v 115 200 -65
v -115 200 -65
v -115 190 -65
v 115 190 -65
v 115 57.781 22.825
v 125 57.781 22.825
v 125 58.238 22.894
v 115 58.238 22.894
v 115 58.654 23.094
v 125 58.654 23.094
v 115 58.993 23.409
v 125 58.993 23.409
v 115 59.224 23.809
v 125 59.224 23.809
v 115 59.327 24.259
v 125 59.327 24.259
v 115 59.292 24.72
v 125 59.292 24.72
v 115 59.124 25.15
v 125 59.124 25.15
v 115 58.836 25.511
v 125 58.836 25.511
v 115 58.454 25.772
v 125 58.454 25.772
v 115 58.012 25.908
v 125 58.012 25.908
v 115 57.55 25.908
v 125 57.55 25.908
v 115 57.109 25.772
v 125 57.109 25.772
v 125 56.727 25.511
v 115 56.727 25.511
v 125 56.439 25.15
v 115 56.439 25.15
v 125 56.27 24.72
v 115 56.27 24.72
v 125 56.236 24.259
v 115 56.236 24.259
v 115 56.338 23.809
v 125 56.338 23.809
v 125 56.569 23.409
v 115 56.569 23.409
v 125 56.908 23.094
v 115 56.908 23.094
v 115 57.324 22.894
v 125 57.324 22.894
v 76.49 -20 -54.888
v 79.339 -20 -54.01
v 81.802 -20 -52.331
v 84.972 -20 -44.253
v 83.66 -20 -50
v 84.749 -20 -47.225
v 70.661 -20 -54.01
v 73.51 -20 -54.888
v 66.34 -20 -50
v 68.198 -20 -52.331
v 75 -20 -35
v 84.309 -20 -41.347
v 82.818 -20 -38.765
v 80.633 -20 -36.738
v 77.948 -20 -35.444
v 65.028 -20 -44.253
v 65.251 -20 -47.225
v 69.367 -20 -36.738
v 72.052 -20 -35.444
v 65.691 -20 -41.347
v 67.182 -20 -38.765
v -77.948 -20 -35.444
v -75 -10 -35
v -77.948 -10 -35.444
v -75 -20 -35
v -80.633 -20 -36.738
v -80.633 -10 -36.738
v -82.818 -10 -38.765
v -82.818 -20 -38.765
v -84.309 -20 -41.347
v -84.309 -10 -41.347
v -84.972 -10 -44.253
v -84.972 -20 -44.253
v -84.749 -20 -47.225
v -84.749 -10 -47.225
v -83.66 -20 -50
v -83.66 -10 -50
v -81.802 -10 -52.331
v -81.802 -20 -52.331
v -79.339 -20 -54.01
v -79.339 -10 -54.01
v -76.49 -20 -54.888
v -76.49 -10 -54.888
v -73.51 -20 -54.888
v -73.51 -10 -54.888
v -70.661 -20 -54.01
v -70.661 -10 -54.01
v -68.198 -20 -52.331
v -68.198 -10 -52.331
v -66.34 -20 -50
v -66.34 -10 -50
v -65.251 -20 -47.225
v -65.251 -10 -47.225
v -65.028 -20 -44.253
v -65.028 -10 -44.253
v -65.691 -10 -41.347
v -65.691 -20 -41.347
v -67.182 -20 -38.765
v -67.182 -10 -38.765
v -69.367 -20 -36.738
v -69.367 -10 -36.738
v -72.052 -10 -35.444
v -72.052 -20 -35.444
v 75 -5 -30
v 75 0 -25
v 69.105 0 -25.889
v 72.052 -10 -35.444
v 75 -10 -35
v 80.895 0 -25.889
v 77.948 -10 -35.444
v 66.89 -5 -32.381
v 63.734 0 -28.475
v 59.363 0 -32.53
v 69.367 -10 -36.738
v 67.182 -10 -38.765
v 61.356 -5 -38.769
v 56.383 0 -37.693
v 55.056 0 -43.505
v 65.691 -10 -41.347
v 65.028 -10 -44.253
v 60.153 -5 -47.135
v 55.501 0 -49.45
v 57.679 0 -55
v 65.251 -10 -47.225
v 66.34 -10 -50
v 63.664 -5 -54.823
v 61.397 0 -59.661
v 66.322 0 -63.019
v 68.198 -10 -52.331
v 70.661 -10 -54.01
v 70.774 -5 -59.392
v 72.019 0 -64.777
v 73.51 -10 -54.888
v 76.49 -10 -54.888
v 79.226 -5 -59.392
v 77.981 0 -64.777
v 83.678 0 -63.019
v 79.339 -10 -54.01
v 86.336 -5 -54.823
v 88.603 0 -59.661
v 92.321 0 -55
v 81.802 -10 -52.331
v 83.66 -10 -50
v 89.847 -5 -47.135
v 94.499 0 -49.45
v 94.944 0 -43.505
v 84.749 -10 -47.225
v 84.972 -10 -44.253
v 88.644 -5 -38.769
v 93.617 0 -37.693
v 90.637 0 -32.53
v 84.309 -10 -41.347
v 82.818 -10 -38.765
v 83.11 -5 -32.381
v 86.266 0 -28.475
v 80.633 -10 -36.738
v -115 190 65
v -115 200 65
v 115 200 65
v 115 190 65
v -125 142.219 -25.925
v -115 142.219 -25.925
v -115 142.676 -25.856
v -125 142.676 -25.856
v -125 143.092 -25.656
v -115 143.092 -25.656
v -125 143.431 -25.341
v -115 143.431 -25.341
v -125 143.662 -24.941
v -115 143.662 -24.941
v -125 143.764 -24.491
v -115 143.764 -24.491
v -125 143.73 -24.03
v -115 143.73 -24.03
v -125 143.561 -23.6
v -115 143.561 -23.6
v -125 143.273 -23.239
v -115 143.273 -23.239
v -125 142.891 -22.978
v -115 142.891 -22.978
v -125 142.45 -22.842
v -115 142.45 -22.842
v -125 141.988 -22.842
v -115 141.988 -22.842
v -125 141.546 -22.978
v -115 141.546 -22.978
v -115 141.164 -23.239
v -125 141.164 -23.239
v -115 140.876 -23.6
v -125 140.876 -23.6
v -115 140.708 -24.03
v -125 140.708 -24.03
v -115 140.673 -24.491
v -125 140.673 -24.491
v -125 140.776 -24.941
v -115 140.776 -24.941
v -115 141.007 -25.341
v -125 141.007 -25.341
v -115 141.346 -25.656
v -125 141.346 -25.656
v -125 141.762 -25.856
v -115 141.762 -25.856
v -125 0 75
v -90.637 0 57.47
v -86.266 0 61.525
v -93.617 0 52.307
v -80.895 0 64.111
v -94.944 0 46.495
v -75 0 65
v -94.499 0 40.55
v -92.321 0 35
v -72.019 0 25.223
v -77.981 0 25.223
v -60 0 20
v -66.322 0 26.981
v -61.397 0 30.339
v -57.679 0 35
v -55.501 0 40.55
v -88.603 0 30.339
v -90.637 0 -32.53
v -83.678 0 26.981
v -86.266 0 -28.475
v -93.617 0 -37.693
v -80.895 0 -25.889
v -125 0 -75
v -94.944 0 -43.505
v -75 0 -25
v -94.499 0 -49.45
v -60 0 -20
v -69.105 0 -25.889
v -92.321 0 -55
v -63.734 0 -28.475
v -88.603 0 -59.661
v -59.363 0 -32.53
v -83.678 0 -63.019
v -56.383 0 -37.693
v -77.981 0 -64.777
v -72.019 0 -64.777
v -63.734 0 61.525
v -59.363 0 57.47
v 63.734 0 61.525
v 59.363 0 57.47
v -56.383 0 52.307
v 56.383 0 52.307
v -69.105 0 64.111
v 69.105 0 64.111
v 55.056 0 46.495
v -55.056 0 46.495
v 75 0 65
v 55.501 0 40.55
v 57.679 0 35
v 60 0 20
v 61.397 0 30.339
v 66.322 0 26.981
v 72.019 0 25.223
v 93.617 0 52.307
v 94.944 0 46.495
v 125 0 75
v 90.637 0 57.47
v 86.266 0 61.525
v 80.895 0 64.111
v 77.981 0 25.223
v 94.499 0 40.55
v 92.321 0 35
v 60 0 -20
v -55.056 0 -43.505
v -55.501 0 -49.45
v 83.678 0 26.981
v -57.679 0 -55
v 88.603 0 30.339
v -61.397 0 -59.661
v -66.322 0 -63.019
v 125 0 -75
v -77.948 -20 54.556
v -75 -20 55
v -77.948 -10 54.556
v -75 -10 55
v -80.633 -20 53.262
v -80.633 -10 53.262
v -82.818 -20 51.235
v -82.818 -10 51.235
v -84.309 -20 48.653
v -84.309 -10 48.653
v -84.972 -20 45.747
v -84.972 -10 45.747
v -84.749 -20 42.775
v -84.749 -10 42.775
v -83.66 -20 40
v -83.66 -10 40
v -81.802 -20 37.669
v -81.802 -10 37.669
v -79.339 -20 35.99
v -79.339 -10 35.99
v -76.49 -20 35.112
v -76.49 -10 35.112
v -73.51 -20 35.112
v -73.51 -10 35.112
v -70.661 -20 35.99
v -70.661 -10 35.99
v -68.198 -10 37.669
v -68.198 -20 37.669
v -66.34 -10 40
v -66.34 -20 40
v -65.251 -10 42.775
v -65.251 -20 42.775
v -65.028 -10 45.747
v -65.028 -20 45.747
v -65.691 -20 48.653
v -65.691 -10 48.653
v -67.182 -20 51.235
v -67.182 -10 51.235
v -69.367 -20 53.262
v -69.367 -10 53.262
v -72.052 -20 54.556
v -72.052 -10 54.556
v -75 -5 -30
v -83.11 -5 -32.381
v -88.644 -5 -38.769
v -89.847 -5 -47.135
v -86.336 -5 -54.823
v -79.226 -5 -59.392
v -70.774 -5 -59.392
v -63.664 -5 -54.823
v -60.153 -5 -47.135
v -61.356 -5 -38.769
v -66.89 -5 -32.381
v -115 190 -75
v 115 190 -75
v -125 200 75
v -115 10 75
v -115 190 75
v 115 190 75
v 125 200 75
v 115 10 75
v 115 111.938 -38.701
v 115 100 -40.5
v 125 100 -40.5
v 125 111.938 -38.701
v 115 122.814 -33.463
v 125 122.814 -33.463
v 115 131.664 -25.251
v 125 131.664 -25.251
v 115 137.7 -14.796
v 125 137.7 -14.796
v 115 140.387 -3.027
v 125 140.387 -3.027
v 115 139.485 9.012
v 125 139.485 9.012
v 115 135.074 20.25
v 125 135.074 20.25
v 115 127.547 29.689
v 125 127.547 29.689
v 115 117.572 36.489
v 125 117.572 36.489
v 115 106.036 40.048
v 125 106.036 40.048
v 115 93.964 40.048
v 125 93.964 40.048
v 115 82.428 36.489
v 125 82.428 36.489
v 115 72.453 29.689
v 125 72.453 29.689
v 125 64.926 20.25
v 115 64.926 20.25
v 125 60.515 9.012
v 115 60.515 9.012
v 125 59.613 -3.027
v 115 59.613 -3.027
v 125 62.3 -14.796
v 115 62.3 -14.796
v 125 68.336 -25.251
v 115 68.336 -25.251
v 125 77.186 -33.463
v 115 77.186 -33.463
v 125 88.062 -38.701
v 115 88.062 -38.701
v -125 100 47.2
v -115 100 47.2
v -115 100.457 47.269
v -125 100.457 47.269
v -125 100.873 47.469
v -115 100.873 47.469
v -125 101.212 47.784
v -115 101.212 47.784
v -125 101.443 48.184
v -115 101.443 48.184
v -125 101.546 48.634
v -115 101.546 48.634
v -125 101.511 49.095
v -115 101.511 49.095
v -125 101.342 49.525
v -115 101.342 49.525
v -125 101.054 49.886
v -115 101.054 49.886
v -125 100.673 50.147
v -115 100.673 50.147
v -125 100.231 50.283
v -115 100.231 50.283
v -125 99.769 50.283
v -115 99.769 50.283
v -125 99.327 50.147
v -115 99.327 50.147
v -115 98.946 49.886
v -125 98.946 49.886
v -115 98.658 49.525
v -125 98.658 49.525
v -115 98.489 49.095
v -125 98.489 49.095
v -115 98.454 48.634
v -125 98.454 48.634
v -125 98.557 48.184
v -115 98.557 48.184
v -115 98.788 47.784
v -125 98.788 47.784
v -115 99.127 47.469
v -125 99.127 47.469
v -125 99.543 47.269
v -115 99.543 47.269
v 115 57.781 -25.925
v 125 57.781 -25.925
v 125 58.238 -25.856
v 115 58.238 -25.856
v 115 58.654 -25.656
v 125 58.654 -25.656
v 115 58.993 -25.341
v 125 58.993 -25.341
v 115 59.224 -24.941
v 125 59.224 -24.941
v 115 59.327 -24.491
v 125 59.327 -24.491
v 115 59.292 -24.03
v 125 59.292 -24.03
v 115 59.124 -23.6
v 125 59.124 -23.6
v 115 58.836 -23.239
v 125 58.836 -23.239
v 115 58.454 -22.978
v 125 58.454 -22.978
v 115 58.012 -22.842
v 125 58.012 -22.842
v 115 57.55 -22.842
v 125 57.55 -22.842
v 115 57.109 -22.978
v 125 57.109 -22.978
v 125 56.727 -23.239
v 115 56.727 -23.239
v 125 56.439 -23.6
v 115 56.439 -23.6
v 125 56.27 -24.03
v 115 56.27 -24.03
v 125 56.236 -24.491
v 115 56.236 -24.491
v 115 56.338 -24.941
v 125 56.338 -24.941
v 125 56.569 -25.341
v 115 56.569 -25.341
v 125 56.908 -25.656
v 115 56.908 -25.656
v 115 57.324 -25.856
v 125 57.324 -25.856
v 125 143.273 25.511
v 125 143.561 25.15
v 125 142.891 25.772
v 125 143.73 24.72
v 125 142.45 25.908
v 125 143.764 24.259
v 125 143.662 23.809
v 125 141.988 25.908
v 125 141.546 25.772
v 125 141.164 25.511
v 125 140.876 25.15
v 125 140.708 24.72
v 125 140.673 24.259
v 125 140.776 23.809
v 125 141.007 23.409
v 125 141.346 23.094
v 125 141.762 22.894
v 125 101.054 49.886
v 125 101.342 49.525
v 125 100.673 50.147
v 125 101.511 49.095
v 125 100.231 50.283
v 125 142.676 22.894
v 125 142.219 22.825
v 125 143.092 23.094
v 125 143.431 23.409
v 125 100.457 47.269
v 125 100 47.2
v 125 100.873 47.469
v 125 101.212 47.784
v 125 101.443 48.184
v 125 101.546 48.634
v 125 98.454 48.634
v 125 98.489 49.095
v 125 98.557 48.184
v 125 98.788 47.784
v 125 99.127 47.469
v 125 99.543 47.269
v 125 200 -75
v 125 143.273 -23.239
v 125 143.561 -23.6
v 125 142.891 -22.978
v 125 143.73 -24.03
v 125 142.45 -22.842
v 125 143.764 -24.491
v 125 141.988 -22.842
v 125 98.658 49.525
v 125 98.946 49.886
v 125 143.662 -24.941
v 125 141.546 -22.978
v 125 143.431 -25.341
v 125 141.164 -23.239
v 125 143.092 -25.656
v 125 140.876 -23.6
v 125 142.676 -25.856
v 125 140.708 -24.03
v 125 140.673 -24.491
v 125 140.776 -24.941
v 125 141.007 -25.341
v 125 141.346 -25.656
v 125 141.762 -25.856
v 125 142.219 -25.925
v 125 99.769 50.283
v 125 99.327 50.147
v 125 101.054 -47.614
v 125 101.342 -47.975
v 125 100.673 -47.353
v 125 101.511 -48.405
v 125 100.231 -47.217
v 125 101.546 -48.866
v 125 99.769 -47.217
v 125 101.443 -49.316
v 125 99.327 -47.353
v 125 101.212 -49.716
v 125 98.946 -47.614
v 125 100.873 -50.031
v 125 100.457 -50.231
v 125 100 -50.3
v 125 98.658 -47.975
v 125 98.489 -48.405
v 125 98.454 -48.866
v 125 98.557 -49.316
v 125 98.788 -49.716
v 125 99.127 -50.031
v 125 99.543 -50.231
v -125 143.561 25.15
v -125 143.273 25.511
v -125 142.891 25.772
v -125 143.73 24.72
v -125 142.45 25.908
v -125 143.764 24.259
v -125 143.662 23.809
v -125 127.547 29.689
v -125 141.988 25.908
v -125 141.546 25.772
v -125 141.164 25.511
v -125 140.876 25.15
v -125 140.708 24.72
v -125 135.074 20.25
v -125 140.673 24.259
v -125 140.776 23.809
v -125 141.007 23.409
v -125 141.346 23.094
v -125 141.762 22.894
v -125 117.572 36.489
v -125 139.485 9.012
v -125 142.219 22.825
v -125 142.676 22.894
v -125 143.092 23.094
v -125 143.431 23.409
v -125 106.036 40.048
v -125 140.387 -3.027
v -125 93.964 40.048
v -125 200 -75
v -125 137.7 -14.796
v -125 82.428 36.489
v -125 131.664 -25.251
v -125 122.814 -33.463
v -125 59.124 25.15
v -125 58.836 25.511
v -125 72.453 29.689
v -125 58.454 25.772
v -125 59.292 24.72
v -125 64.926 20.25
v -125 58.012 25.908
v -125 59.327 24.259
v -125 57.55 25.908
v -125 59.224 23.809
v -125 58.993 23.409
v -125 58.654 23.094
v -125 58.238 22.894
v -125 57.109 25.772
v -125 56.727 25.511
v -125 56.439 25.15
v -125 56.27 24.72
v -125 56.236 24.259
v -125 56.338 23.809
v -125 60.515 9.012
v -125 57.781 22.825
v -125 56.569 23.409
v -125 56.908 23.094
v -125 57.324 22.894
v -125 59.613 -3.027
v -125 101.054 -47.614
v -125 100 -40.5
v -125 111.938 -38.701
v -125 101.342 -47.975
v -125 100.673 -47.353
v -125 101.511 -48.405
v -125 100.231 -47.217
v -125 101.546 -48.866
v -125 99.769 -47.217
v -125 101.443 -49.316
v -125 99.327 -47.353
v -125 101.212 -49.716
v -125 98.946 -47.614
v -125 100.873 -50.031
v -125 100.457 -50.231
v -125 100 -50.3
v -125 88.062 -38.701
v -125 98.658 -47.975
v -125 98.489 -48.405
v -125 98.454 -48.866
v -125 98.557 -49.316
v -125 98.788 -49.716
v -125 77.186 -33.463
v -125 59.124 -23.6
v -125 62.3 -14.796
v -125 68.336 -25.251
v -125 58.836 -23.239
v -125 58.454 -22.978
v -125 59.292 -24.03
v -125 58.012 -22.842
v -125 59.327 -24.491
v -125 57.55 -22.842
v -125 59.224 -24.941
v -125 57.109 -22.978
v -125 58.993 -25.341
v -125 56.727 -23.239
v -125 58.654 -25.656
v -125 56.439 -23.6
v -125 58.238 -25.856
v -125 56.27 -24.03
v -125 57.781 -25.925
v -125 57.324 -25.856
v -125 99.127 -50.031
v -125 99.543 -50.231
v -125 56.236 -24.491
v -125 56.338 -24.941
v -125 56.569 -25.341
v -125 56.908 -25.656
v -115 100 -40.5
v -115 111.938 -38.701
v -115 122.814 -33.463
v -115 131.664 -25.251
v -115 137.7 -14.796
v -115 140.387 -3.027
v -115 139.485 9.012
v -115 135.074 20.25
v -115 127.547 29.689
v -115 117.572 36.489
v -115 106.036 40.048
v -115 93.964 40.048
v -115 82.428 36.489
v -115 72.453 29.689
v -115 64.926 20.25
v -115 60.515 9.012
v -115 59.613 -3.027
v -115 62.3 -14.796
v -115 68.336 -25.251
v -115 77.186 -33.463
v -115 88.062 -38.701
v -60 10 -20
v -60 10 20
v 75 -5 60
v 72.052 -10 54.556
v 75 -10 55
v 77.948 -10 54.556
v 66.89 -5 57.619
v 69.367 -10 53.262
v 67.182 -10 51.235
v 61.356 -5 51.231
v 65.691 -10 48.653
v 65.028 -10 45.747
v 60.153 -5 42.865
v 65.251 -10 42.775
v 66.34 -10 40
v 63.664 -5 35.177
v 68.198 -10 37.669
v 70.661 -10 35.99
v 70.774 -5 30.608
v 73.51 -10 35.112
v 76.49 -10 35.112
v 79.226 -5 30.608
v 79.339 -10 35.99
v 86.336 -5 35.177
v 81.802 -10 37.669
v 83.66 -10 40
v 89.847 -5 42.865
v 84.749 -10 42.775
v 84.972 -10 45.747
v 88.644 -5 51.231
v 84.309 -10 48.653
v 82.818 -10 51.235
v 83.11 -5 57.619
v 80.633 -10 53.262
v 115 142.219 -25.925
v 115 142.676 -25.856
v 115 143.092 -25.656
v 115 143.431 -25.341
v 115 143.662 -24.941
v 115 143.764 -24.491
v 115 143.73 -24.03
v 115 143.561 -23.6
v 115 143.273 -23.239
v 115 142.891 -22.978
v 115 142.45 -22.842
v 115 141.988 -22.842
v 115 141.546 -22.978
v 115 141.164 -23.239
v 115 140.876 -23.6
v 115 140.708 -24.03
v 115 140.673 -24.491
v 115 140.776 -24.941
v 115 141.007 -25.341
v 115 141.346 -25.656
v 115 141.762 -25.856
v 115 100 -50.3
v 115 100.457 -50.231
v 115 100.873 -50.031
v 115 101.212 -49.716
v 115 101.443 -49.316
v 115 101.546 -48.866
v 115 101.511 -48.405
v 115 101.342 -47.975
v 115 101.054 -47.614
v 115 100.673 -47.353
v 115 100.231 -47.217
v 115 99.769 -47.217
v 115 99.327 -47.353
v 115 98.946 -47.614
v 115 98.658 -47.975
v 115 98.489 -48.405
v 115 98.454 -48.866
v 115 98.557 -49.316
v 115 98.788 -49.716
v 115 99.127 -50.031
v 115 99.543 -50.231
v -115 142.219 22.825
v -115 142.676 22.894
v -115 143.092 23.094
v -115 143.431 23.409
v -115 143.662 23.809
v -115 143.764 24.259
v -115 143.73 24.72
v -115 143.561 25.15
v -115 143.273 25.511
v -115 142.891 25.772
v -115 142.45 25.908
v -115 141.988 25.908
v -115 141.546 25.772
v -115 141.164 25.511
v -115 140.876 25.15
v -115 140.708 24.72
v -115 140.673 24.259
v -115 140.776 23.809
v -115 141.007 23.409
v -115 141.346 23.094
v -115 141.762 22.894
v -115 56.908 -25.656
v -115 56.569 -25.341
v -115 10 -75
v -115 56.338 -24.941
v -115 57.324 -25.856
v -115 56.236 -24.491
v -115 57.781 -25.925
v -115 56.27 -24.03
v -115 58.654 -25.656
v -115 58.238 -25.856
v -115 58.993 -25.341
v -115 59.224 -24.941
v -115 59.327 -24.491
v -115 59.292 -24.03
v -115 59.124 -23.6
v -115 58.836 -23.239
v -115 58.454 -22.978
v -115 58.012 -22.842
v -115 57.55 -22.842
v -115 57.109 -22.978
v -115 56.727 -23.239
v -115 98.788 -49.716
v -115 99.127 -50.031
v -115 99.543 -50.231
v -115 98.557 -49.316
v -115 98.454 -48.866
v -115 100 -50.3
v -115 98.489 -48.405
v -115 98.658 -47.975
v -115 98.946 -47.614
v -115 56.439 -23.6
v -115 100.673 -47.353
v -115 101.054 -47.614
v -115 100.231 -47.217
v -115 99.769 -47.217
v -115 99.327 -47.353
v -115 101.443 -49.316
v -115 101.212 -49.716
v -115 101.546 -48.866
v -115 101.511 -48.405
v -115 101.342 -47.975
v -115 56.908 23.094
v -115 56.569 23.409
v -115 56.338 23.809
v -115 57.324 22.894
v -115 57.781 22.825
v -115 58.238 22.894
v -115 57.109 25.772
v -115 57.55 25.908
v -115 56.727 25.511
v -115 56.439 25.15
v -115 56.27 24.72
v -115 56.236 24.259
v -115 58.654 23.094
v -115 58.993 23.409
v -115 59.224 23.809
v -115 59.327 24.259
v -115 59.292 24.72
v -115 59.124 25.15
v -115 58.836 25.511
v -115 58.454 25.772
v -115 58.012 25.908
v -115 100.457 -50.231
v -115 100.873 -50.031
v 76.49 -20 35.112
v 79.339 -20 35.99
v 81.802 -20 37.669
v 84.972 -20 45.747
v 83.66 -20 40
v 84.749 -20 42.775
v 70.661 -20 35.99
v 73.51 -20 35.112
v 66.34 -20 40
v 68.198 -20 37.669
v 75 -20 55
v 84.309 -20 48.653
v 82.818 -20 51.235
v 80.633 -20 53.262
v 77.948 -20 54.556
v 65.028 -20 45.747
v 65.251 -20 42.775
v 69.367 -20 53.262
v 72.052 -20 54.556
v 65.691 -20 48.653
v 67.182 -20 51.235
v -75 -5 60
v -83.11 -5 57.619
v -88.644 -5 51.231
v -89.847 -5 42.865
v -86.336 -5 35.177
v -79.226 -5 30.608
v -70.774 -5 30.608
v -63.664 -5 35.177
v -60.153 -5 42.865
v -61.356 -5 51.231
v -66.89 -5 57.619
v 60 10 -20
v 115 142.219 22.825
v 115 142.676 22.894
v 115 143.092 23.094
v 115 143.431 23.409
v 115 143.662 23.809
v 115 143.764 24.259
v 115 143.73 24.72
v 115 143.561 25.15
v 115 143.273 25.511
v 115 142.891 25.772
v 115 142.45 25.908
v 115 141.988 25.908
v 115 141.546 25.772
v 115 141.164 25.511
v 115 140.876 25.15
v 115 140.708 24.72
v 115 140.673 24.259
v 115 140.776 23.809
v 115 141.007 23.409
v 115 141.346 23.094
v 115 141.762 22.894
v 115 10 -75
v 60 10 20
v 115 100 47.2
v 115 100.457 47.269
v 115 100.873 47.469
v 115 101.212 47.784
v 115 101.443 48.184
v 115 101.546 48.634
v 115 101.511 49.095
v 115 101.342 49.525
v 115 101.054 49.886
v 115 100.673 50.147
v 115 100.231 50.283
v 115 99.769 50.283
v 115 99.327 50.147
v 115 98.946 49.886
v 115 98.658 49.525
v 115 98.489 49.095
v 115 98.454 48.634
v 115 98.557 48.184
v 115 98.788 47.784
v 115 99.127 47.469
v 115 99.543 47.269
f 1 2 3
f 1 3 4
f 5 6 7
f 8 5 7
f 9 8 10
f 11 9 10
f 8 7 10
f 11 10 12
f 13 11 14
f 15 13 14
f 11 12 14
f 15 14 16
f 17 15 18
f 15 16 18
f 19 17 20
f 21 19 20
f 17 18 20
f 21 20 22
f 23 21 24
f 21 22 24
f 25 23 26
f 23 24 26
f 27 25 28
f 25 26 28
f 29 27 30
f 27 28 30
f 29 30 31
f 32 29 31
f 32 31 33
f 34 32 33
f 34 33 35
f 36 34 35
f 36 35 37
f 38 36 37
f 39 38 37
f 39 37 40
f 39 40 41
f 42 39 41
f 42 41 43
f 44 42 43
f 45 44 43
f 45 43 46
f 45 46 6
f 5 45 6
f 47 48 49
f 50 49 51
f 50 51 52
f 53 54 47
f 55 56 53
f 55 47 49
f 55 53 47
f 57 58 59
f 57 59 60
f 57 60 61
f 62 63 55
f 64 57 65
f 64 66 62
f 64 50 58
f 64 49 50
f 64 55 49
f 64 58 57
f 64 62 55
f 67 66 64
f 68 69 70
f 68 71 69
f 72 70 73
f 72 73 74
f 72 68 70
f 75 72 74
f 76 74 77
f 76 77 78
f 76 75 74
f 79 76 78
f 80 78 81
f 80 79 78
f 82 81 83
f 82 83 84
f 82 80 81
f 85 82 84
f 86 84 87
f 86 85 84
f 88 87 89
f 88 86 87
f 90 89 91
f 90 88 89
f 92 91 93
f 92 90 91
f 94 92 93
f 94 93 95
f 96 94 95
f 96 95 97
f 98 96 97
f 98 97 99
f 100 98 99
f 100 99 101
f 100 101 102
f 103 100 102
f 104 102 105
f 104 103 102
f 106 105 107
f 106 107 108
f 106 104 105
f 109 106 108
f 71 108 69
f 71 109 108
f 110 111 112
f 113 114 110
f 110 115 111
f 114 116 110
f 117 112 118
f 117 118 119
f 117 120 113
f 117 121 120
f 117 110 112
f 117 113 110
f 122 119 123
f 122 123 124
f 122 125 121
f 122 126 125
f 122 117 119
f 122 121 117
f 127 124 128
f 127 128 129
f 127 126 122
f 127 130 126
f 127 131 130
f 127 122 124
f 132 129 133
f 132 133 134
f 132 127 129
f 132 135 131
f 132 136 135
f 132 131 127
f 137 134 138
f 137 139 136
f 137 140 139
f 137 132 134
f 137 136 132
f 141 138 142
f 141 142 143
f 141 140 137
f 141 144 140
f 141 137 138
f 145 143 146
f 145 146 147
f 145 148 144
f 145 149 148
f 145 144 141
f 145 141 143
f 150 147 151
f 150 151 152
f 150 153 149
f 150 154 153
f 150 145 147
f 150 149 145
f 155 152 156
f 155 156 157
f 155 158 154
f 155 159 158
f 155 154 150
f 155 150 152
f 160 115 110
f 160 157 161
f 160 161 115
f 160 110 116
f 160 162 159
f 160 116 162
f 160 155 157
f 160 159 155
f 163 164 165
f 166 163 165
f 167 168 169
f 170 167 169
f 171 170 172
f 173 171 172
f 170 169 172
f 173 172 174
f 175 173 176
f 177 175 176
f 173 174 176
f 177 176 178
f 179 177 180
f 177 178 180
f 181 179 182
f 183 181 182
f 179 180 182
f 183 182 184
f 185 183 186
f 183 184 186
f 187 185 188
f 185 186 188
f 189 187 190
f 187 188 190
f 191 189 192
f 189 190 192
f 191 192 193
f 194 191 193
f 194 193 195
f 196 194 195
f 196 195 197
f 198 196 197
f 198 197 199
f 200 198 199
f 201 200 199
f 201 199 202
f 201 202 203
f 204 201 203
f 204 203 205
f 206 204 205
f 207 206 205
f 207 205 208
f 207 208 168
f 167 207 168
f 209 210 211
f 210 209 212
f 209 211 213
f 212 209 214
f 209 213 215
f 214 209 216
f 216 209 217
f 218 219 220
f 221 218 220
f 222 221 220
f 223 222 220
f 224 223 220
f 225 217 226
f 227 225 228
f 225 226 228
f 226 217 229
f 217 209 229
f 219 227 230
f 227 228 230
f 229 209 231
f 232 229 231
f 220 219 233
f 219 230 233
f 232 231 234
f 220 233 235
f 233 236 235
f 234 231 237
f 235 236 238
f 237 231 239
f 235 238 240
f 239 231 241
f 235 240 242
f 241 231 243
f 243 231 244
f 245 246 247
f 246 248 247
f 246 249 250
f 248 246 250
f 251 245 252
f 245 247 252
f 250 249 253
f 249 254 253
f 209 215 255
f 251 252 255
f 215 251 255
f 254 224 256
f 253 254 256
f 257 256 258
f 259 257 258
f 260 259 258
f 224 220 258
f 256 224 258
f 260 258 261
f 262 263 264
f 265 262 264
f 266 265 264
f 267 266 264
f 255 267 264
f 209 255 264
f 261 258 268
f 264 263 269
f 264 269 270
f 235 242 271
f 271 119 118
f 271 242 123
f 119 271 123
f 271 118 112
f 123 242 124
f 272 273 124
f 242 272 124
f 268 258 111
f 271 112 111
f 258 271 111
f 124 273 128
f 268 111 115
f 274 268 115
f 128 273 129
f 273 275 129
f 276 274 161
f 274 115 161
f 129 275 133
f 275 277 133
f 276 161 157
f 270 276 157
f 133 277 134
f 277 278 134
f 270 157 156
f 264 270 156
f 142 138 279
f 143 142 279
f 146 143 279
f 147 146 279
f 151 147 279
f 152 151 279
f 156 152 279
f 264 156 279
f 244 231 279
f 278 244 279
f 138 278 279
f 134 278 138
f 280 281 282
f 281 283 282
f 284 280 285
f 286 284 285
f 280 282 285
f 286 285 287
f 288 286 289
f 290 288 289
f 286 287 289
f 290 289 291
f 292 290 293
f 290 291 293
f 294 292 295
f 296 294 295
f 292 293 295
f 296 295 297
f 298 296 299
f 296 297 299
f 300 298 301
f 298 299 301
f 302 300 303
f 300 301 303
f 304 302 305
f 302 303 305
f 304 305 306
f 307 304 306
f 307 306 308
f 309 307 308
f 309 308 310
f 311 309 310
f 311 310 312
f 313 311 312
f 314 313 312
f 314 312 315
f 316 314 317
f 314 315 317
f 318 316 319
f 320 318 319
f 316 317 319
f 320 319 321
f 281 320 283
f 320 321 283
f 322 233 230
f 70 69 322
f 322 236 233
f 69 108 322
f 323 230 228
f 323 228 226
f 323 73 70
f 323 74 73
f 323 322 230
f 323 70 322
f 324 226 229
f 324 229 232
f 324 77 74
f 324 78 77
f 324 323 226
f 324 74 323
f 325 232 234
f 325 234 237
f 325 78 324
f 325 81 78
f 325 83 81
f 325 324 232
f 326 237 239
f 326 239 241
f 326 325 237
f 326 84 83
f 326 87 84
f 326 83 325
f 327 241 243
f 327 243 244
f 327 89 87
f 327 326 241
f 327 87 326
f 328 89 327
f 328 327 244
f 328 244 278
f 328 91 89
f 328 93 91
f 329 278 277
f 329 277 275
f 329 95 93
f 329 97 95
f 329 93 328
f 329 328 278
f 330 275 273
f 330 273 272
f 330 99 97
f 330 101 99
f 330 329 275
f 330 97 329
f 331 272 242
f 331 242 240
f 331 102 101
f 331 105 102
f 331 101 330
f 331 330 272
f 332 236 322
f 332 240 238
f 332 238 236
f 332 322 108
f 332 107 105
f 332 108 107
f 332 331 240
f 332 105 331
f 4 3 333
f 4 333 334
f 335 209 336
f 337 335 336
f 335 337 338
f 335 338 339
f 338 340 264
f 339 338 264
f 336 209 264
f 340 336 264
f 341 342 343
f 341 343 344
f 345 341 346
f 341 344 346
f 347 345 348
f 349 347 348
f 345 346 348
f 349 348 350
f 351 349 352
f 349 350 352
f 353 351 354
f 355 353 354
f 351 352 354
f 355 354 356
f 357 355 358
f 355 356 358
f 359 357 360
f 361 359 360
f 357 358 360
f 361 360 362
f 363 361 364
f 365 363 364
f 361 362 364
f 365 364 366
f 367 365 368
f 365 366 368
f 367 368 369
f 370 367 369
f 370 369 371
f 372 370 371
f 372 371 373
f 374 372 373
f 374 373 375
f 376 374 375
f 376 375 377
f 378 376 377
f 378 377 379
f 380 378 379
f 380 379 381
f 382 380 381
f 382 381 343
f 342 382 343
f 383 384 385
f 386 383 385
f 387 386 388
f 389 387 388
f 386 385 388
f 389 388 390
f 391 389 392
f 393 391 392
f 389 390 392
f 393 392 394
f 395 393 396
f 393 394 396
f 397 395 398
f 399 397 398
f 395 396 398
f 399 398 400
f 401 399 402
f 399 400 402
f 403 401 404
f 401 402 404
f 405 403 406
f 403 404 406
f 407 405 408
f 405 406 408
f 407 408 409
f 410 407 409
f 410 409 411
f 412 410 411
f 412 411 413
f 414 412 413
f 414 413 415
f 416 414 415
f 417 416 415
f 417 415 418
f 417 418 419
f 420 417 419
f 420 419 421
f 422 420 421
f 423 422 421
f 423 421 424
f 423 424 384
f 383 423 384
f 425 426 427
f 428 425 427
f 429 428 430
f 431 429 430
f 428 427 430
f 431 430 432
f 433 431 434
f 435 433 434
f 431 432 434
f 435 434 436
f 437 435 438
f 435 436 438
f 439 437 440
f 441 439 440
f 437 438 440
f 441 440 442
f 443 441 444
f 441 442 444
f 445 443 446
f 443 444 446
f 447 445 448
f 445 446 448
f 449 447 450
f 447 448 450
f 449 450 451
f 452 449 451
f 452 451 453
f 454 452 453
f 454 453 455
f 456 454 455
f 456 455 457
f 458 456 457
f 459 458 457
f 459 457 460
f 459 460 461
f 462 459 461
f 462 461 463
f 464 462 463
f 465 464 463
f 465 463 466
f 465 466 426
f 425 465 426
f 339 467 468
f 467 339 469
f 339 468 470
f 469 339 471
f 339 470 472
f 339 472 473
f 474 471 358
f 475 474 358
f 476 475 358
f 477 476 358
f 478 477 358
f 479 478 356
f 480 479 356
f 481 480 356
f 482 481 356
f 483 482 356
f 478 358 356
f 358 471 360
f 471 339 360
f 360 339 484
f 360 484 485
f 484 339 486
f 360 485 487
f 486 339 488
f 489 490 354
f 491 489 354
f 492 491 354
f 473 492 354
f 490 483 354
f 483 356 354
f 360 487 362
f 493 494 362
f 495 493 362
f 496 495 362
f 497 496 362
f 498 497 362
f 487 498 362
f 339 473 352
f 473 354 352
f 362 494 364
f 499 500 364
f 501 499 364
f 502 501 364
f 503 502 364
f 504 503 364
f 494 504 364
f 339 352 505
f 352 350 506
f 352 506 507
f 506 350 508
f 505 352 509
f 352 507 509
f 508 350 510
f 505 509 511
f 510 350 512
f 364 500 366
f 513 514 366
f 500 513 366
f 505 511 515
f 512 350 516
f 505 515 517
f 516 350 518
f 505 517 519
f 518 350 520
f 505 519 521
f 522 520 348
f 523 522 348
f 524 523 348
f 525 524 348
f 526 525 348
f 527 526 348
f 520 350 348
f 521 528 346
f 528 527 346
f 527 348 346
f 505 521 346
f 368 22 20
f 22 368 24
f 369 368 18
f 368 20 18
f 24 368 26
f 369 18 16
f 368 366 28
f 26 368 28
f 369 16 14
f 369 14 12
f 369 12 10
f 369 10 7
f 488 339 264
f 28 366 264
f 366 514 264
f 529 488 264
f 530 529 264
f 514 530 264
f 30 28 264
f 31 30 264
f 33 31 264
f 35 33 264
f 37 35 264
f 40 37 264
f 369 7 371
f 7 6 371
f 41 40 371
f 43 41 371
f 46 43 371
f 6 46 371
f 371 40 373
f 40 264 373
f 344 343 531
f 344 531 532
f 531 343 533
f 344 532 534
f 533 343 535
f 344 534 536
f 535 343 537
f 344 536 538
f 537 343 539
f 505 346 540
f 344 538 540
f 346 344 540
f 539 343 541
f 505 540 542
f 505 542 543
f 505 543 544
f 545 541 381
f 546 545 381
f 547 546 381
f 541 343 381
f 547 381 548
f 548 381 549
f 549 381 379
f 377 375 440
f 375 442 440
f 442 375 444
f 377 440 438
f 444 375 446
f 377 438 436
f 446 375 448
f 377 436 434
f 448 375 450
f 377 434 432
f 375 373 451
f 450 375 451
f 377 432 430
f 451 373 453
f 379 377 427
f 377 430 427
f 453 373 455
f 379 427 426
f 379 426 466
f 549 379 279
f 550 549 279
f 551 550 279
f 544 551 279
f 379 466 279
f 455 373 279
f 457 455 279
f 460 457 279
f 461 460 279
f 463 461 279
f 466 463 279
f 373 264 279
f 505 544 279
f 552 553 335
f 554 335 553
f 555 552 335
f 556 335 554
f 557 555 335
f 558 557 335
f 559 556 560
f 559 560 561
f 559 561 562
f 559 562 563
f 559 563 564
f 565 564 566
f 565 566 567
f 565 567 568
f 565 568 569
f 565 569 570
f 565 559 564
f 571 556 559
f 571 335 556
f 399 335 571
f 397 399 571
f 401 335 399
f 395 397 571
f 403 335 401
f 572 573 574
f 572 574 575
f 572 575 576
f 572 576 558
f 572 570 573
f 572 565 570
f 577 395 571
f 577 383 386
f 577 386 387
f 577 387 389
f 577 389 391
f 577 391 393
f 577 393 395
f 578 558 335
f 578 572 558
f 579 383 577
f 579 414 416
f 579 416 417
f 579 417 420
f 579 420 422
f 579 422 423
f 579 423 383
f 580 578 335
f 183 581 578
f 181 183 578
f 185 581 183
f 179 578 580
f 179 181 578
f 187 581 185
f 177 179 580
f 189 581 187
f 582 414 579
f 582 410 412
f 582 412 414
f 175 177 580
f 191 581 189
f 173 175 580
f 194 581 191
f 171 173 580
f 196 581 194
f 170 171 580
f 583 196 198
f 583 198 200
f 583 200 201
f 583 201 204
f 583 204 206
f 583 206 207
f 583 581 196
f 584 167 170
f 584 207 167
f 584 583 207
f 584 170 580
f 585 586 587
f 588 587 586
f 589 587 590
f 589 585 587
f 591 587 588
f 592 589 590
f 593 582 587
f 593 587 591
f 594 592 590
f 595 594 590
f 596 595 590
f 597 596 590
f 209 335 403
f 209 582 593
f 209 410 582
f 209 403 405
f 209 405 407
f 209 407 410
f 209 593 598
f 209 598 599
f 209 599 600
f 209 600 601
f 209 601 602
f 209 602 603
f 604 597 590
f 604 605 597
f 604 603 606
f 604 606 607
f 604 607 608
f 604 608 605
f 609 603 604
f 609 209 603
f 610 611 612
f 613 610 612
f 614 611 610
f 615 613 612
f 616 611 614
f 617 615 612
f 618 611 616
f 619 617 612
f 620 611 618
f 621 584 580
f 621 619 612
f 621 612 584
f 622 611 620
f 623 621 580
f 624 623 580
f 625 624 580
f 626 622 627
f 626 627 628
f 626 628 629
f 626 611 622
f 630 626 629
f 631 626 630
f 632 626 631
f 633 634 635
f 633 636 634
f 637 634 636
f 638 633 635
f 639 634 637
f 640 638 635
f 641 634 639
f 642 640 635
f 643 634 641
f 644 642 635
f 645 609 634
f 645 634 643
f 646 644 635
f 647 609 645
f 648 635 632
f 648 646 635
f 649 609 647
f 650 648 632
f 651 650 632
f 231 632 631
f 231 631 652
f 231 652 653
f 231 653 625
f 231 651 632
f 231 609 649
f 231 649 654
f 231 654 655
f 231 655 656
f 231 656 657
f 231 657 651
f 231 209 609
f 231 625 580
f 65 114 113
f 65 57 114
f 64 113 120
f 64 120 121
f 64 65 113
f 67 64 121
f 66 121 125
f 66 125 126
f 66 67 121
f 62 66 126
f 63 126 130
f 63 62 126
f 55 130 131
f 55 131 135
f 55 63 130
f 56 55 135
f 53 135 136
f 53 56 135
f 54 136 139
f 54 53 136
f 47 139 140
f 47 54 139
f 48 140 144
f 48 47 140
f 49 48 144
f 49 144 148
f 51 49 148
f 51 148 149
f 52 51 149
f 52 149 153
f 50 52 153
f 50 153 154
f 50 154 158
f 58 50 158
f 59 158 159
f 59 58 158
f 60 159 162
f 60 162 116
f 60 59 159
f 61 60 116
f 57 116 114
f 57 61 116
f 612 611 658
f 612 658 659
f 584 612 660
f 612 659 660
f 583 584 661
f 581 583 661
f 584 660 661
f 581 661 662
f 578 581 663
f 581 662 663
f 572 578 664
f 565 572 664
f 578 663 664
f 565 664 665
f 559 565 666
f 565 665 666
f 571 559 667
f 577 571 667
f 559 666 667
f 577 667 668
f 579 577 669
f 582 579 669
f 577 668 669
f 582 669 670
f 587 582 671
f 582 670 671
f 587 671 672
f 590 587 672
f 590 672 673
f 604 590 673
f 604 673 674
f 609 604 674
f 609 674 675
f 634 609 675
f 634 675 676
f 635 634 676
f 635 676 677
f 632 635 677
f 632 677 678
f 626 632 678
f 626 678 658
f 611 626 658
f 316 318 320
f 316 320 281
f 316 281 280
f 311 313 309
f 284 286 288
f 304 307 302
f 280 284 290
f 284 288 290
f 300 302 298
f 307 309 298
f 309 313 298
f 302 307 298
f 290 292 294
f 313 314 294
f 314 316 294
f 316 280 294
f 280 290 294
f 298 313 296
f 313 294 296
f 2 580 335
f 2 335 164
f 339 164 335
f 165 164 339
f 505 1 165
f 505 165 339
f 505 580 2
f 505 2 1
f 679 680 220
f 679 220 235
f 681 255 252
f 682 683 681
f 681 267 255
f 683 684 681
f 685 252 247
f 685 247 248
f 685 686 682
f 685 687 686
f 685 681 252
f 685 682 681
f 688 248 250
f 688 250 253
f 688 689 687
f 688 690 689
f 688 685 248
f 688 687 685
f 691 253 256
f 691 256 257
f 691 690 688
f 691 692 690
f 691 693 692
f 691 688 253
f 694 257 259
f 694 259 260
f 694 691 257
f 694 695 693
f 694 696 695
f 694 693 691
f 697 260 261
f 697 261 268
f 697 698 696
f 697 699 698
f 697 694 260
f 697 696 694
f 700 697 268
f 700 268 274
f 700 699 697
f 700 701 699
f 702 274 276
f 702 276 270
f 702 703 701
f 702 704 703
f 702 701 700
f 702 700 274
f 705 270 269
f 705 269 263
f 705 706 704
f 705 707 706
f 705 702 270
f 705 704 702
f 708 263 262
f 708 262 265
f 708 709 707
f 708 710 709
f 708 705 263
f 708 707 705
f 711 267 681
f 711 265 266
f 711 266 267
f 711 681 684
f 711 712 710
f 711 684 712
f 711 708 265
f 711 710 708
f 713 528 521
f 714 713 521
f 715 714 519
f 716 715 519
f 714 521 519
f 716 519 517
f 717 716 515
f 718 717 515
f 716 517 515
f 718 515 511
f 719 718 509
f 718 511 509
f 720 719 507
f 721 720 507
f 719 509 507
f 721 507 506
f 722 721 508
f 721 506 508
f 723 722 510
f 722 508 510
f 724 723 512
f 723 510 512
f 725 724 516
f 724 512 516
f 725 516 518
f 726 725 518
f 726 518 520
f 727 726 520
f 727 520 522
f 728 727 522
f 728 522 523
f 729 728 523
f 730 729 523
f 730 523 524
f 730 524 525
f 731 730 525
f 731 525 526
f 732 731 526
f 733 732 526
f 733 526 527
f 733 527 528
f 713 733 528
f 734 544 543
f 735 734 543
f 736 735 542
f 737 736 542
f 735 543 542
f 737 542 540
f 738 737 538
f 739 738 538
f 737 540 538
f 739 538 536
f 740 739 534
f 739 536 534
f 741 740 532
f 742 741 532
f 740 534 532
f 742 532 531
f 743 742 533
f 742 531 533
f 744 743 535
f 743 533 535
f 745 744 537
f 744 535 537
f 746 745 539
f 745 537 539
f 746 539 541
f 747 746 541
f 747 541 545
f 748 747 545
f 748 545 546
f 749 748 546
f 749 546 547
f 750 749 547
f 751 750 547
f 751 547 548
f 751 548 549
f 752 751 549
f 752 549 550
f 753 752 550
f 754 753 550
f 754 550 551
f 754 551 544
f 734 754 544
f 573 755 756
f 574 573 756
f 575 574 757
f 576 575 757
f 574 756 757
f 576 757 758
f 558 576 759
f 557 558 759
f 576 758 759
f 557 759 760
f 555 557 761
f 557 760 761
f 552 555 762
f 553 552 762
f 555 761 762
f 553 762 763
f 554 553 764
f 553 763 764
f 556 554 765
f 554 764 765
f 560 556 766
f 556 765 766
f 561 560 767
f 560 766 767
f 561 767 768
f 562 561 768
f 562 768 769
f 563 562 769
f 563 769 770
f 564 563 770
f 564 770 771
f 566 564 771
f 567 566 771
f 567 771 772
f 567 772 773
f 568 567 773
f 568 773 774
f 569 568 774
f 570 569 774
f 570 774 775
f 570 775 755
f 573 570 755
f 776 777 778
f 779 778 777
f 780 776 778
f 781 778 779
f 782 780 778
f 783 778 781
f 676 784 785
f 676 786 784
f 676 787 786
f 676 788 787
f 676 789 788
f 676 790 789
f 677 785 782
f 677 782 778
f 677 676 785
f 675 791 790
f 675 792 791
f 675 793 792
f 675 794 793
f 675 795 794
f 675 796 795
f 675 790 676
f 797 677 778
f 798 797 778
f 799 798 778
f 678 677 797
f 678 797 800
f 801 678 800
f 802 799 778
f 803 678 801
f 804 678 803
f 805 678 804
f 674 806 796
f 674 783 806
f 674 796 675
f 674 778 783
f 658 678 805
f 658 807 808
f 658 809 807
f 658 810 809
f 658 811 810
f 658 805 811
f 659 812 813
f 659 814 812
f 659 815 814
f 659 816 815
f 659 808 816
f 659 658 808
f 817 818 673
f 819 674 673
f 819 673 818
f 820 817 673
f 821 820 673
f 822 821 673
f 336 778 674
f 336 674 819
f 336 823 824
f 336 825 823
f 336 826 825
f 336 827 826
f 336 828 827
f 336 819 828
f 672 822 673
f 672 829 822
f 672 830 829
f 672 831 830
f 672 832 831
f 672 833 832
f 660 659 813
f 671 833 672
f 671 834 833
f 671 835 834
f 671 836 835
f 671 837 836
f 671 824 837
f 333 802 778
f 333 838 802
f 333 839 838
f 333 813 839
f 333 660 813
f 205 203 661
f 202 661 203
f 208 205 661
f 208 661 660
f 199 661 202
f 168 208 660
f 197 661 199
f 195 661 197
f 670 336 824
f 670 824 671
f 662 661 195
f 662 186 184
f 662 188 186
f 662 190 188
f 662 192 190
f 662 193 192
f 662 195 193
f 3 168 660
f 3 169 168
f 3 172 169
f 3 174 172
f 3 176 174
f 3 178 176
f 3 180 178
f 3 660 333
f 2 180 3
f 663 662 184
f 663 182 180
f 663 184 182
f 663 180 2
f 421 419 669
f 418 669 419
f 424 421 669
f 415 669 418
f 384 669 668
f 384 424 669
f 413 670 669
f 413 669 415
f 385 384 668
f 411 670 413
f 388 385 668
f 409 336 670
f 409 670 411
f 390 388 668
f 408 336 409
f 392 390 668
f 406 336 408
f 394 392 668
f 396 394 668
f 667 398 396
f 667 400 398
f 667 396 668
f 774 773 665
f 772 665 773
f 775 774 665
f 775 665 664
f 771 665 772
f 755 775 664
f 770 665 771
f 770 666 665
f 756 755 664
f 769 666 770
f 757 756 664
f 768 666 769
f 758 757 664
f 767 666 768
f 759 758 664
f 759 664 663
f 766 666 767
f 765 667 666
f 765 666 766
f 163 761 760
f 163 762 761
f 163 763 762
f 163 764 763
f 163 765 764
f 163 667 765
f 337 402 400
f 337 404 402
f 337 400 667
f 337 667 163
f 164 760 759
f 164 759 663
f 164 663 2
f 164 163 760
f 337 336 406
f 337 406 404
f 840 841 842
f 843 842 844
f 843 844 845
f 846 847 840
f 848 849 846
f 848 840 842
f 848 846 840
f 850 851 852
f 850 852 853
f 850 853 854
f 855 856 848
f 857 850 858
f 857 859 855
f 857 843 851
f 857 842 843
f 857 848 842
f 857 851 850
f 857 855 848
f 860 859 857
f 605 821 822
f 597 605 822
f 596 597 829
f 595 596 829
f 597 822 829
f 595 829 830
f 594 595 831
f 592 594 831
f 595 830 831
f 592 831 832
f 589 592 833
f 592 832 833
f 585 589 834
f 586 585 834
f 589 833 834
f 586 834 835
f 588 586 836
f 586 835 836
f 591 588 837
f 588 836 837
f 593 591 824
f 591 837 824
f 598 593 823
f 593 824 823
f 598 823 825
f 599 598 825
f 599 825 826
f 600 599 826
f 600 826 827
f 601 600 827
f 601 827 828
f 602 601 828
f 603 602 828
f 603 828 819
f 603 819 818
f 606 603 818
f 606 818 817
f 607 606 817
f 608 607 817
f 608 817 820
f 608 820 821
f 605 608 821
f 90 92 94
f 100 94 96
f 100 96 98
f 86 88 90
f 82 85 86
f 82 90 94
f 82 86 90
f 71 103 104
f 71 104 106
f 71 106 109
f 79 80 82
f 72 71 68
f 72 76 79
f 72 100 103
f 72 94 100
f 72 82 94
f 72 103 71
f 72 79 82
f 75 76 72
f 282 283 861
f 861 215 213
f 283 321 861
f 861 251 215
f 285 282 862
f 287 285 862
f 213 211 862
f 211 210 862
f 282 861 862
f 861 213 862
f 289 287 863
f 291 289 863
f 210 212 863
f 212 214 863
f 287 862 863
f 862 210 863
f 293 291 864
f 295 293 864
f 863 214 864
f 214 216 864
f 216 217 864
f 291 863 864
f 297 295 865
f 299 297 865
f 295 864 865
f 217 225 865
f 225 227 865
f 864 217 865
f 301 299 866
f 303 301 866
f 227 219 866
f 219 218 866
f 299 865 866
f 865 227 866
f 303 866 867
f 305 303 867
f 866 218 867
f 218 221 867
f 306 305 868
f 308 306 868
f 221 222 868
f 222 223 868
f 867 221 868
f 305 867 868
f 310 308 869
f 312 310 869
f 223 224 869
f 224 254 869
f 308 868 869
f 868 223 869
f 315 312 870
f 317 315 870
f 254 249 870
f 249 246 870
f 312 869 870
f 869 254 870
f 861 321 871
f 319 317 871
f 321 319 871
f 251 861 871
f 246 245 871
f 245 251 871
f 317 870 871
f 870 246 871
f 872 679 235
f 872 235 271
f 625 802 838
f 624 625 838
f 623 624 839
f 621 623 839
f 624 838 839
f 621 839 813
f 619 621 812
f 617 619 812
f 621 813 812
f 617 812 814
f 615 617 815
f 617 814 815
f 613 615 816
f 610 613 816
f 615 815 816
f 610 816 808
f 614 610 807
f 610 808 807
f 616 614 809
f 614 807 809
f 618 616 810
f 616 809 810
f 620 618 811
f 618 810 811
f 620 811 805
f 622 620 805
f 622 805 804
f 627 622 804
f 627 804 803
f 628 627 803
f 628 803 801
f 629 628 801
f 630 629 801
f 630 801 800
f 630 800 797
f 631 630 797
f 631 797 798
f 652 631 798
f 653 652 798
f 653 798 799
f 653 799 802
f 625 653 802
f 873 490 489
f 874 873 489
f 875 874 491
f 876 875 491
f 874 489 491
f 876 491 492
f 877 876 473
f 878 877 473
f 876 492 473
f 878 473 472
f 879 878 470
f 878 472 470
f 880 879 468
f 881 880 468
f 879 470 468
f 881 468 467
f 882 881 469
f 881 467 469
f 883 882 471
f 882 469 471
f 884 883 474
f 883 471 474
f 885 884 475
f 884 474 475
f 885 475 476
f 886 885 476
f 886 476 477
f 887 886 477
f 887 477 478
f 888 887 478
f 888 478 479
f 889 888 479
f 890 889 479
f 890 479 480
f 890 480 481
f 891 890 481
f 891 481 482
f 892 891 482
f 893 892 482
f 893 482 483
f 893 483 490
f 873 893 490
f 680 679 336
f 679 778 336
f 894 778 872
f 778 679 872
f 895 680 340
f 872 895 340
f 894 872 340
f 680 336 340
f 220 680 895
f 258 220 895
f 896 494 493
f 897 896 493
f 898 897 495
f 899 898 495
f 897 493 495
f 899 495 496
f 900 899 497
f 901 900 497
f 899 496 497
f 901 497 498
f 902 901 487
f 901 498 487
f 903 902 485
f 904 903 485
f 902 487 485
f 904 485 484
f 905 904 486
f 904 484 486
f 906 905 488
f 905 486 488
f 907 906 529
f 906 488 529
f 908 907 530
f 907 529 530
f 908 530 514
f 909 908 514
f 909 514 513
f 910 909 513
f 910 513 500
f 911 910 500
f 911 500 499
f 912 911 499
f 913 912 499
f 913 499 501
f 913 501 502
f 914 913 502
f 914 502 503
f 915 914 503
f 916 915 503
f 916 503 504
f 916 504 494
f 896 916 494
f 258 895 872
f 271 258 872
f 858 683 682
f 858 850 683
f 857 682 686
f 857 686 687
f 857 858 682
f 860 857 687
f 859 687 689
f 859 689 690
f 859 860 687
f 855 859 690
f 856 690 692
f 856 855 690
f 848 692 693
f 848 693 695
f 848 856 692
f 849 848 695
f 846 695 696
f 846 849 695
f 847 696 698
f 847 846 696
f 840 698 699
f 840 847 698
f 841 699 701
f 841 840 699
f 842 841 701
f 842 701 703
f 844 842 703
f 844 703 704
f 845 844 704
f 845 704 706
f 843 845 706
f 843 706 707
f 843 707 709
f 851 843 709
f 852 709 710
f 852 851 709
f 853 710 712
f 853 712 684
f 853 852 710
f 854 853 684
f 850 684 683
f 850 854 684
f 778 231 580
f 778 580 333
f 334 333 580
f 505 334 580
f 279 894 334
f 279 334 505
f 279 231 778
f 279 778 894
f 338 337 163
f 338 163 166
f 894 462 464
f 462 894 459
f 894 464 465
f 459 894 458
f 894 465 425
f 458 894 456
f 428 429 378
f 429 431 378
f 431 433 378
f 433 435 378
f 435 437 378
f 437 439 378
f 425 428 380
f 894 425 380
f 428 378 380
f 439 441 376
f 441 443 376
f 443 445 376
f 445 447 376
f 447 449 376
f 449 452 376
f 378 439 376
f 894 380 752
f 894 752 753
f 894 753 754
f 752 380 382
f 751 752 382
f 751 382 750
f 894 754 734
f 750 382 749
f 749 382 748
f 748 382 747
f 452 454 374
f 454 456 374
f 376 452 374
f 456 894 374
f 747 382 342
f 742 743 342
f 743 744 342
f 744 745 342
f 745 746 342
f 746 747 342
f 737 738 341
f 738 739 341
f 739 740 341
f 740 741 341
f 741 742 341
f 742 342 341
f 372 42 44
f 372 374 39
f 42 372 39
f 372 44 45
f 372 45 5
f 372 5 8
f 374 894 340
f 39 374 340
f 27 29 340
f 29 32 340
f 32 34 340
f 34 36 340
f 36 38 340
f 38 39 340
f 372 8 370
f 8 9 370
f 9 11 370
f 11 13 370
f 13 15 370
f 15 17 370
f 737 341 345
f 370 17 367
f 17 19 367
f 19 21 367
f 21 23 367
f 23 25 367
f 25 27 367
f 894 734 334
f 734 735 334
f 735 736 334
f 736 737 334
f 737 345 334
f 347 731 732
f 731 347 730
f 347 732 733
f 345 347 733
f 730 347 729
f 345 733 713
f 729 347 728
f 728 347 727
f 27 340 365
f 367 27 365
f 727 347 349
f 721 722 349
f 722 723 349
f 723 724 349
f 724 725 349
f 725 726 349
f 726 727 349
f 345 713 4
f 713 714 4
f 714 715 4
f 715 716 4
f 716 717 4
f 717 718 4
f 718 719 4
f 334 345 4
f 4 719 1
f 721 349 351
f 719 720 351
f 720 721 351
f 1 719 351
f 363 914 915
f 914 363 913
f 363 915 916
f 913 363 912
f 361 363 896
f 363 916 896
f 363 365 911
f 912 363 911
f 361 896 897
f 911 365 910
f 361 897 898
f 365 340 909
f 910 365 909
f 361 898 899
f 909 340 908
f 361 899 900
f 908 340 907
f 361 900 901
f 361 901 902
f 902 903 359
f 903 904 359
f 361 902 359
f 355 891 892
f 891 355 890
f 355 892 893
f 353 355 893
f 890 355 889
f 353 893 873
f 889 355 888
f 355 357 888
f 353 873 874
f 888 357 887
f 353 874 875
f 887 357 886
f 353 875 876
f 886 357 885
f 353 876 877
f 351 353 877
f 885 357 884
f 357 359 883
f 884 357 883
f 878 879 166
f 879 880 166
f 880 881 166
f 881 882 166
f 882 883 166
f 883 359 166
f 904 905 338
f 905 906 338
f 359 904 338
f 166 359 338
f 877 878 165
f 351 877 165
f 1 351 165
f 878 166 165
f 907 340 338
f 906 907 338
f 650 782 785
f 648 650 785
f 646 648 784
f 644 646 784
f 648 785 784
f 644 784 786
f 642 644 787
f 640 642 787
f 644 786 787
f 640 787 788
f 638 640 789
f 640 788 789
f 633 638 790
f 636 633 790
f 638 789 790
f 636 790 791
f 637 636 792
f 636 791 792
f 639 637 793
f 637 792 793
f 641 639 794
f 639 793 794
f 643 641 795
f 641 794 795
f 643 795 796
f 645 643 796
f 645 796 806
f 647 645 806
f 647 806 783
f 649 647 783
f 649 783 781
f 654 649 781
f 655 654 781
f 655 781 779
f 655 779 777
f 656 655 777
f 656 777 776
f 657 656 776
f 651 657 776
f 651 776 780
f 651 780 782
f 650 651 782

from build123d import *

# Parameters (mm, degrees)
SKETCH_1_W          = 250
SKETCH_1_H          = 150
EXTRUDE_2_DEPTH     = 200
SKETCH_3_W          = 230
SKETCH_3_H          = 130
CUT_EXTRUDE_1_DEPTH = 190
SKETCH_4_W          = 230
SKETCH_4_H          = 180
CUT_EXTRUDE_2_DEPTH = 190
SKETCH_5_R          = 40.5
SKETCH_5_R_2        = 1.55
CUT_EXTRUDE_3_DEPTH = 250
SKETCH_14_W         = 120
SKETCH_14_H         = 40
CUT_EXTRUDE_4_DEPTH = 20


with BuildPart() as part:
    # 草图1 → 凸台-拉伸2 (new body)
    with BuildSketch(Plane(origin=(0, 0, 0), x_dir=(1, 0, 0), z_dir=(0, 1, 0))):
        Rectangle(SKETCH_1_W, SKETCH_1_H)
    extrude(amount=EXTRUDE_2_DEPTH)

    # 草图3 → 切除-拉伸1 (cut)
    with BuildSketch(Plane(origin=(0, 200, 0), x_dir=(1, 0, 0), z_dir=(0, 1, 0))):
        Rectangle(SKETCH_3_W, SKETCH_3_H)
    extrude(amount=-CUT_EXTRUDE_1_DEPTH, mode=Mode.SUBTRACT)

    # 草图4 → 切除-拉伸2 (cut)
    with BuildSketch(Plane.XY.offset(75)):
        with Locations((0, 100)):
            Rectangle(SKETCH_4_W, SKETCH_4_H)
    extrude(amount=-CUT_EXTRUDE_2_DEPTH, mode=Mode.SUBTRACT)

    # 草图5 → 切除-拉伸3 (cut)
    with BuildSketch(Plane(origin=(125, 0, 0), x_dir=(0, 0, -1), z_dir=(1, 0, 0))):
        with Locations((0, 100)):
            Circle(SKETCH_5_R)
        with Locations((-24.375, 142.218738434)):
            Circle(SKETCH_5_R_2)
        with Locations((-48.75, 100)):
            Circle(SKETCH_5_R_2)
        with Locations((24.375, 142.218738434)):
            Circle(SKETCH_5_R_2)
        with Locations((48.75, 100)):
            Circle(SKETCH_5_R_2)
        with Locations((24.375, 57.781261566)):
            Circle(SKETCH_5_R_2)
        with Locations((-24.375, 57.781261566)):
            Circle(SKETCH_5_R_2)
    extrude(amount=-CUT_EXTRUDE_3_DEPTH, mode=Mode.SUBTRACT)

    # 草图10 → 旋转2 (revolve)
    with BuildSketch(Plane.XY.offset(45), mode=Mode.PRIVATE) as revolve_2_sk:
        Polygon((-75, 0), (-75, -20), (-85, -20), (-85, -10), (-95, 0), (-85, 0), align=None)
    revolve(revolve_2_sk.sketch.rotate(Axis((-75, 0, 45), (0, -1, 0)), 270), axis=Axis((-75, 0, 45), (0, -1, 0)))

    # 草图11 → 旋转4 (revolve)
    with BuildSketch(Plane.XY.offset(45), mode=Mode.PRIVATE) as revolve_4_sk:
        Polygon((75, 0), (55, 0), (65, -10), (65, -20), (75, -20), align=None)
    revolve(revolve_4_sk.sketch.rotate(Axis((75, 0, 45), (0, -1, 0)), 270), axis=Axis((75, 0, 45), (0, -1, 0)))

    # 草图12 → 旋转5 (revolve)
    with BuildSketch(Plane(origin=(0, 0, -45), x_dir=(-1, 0, 0), z_dir=(0, 0, -1)), mode=Mode.PRIVATE) as revolve_5_sk:
        Polygon((-75, 0), (-55, 0), (-65, -10), (-65, -20), (-75, -20), align=None)
    revolve(revolve_5_sk.sketch.rotate(Axis((75, 0, -45), (0, -1, 0)), 270), axis=Axis((75, 0, -45), (0, -1, 0)))

    # 草图13 → 旋转6 (revolve)
    with BuildSketch(Plane(origin=(0, 0, -45), x_dir=(-1, 0, 0), z_dir=(0, 0, -1)), mode=Mode.PRIVATE) as revolve_6_sk:
        Polygon((75, 0), (55, 0), (65, -10), (65, -20), (75, -20), align=None)
    revolve(revolve_6_sk.sketch.rotate(Axis((-75, 0, -45), (0, -1, 0)), 90), axis=Axis((-75, 0, -45), (0, -1, 0)))

    # 草图14 → 切除-拉伸4 (cut)
    with BuildSketch(Plane(origin=(0, 10, 0), x_dir=(1, 0, 0), z_dir=(0, 1, 0))):
        Rectangle(SKETCH_14_W, SKETCH_14_H)
    extrude(amount=-CUT_EXTRUDE_4_DEPTH, mode=Mode.SUBTRACT)


solid = part.part
